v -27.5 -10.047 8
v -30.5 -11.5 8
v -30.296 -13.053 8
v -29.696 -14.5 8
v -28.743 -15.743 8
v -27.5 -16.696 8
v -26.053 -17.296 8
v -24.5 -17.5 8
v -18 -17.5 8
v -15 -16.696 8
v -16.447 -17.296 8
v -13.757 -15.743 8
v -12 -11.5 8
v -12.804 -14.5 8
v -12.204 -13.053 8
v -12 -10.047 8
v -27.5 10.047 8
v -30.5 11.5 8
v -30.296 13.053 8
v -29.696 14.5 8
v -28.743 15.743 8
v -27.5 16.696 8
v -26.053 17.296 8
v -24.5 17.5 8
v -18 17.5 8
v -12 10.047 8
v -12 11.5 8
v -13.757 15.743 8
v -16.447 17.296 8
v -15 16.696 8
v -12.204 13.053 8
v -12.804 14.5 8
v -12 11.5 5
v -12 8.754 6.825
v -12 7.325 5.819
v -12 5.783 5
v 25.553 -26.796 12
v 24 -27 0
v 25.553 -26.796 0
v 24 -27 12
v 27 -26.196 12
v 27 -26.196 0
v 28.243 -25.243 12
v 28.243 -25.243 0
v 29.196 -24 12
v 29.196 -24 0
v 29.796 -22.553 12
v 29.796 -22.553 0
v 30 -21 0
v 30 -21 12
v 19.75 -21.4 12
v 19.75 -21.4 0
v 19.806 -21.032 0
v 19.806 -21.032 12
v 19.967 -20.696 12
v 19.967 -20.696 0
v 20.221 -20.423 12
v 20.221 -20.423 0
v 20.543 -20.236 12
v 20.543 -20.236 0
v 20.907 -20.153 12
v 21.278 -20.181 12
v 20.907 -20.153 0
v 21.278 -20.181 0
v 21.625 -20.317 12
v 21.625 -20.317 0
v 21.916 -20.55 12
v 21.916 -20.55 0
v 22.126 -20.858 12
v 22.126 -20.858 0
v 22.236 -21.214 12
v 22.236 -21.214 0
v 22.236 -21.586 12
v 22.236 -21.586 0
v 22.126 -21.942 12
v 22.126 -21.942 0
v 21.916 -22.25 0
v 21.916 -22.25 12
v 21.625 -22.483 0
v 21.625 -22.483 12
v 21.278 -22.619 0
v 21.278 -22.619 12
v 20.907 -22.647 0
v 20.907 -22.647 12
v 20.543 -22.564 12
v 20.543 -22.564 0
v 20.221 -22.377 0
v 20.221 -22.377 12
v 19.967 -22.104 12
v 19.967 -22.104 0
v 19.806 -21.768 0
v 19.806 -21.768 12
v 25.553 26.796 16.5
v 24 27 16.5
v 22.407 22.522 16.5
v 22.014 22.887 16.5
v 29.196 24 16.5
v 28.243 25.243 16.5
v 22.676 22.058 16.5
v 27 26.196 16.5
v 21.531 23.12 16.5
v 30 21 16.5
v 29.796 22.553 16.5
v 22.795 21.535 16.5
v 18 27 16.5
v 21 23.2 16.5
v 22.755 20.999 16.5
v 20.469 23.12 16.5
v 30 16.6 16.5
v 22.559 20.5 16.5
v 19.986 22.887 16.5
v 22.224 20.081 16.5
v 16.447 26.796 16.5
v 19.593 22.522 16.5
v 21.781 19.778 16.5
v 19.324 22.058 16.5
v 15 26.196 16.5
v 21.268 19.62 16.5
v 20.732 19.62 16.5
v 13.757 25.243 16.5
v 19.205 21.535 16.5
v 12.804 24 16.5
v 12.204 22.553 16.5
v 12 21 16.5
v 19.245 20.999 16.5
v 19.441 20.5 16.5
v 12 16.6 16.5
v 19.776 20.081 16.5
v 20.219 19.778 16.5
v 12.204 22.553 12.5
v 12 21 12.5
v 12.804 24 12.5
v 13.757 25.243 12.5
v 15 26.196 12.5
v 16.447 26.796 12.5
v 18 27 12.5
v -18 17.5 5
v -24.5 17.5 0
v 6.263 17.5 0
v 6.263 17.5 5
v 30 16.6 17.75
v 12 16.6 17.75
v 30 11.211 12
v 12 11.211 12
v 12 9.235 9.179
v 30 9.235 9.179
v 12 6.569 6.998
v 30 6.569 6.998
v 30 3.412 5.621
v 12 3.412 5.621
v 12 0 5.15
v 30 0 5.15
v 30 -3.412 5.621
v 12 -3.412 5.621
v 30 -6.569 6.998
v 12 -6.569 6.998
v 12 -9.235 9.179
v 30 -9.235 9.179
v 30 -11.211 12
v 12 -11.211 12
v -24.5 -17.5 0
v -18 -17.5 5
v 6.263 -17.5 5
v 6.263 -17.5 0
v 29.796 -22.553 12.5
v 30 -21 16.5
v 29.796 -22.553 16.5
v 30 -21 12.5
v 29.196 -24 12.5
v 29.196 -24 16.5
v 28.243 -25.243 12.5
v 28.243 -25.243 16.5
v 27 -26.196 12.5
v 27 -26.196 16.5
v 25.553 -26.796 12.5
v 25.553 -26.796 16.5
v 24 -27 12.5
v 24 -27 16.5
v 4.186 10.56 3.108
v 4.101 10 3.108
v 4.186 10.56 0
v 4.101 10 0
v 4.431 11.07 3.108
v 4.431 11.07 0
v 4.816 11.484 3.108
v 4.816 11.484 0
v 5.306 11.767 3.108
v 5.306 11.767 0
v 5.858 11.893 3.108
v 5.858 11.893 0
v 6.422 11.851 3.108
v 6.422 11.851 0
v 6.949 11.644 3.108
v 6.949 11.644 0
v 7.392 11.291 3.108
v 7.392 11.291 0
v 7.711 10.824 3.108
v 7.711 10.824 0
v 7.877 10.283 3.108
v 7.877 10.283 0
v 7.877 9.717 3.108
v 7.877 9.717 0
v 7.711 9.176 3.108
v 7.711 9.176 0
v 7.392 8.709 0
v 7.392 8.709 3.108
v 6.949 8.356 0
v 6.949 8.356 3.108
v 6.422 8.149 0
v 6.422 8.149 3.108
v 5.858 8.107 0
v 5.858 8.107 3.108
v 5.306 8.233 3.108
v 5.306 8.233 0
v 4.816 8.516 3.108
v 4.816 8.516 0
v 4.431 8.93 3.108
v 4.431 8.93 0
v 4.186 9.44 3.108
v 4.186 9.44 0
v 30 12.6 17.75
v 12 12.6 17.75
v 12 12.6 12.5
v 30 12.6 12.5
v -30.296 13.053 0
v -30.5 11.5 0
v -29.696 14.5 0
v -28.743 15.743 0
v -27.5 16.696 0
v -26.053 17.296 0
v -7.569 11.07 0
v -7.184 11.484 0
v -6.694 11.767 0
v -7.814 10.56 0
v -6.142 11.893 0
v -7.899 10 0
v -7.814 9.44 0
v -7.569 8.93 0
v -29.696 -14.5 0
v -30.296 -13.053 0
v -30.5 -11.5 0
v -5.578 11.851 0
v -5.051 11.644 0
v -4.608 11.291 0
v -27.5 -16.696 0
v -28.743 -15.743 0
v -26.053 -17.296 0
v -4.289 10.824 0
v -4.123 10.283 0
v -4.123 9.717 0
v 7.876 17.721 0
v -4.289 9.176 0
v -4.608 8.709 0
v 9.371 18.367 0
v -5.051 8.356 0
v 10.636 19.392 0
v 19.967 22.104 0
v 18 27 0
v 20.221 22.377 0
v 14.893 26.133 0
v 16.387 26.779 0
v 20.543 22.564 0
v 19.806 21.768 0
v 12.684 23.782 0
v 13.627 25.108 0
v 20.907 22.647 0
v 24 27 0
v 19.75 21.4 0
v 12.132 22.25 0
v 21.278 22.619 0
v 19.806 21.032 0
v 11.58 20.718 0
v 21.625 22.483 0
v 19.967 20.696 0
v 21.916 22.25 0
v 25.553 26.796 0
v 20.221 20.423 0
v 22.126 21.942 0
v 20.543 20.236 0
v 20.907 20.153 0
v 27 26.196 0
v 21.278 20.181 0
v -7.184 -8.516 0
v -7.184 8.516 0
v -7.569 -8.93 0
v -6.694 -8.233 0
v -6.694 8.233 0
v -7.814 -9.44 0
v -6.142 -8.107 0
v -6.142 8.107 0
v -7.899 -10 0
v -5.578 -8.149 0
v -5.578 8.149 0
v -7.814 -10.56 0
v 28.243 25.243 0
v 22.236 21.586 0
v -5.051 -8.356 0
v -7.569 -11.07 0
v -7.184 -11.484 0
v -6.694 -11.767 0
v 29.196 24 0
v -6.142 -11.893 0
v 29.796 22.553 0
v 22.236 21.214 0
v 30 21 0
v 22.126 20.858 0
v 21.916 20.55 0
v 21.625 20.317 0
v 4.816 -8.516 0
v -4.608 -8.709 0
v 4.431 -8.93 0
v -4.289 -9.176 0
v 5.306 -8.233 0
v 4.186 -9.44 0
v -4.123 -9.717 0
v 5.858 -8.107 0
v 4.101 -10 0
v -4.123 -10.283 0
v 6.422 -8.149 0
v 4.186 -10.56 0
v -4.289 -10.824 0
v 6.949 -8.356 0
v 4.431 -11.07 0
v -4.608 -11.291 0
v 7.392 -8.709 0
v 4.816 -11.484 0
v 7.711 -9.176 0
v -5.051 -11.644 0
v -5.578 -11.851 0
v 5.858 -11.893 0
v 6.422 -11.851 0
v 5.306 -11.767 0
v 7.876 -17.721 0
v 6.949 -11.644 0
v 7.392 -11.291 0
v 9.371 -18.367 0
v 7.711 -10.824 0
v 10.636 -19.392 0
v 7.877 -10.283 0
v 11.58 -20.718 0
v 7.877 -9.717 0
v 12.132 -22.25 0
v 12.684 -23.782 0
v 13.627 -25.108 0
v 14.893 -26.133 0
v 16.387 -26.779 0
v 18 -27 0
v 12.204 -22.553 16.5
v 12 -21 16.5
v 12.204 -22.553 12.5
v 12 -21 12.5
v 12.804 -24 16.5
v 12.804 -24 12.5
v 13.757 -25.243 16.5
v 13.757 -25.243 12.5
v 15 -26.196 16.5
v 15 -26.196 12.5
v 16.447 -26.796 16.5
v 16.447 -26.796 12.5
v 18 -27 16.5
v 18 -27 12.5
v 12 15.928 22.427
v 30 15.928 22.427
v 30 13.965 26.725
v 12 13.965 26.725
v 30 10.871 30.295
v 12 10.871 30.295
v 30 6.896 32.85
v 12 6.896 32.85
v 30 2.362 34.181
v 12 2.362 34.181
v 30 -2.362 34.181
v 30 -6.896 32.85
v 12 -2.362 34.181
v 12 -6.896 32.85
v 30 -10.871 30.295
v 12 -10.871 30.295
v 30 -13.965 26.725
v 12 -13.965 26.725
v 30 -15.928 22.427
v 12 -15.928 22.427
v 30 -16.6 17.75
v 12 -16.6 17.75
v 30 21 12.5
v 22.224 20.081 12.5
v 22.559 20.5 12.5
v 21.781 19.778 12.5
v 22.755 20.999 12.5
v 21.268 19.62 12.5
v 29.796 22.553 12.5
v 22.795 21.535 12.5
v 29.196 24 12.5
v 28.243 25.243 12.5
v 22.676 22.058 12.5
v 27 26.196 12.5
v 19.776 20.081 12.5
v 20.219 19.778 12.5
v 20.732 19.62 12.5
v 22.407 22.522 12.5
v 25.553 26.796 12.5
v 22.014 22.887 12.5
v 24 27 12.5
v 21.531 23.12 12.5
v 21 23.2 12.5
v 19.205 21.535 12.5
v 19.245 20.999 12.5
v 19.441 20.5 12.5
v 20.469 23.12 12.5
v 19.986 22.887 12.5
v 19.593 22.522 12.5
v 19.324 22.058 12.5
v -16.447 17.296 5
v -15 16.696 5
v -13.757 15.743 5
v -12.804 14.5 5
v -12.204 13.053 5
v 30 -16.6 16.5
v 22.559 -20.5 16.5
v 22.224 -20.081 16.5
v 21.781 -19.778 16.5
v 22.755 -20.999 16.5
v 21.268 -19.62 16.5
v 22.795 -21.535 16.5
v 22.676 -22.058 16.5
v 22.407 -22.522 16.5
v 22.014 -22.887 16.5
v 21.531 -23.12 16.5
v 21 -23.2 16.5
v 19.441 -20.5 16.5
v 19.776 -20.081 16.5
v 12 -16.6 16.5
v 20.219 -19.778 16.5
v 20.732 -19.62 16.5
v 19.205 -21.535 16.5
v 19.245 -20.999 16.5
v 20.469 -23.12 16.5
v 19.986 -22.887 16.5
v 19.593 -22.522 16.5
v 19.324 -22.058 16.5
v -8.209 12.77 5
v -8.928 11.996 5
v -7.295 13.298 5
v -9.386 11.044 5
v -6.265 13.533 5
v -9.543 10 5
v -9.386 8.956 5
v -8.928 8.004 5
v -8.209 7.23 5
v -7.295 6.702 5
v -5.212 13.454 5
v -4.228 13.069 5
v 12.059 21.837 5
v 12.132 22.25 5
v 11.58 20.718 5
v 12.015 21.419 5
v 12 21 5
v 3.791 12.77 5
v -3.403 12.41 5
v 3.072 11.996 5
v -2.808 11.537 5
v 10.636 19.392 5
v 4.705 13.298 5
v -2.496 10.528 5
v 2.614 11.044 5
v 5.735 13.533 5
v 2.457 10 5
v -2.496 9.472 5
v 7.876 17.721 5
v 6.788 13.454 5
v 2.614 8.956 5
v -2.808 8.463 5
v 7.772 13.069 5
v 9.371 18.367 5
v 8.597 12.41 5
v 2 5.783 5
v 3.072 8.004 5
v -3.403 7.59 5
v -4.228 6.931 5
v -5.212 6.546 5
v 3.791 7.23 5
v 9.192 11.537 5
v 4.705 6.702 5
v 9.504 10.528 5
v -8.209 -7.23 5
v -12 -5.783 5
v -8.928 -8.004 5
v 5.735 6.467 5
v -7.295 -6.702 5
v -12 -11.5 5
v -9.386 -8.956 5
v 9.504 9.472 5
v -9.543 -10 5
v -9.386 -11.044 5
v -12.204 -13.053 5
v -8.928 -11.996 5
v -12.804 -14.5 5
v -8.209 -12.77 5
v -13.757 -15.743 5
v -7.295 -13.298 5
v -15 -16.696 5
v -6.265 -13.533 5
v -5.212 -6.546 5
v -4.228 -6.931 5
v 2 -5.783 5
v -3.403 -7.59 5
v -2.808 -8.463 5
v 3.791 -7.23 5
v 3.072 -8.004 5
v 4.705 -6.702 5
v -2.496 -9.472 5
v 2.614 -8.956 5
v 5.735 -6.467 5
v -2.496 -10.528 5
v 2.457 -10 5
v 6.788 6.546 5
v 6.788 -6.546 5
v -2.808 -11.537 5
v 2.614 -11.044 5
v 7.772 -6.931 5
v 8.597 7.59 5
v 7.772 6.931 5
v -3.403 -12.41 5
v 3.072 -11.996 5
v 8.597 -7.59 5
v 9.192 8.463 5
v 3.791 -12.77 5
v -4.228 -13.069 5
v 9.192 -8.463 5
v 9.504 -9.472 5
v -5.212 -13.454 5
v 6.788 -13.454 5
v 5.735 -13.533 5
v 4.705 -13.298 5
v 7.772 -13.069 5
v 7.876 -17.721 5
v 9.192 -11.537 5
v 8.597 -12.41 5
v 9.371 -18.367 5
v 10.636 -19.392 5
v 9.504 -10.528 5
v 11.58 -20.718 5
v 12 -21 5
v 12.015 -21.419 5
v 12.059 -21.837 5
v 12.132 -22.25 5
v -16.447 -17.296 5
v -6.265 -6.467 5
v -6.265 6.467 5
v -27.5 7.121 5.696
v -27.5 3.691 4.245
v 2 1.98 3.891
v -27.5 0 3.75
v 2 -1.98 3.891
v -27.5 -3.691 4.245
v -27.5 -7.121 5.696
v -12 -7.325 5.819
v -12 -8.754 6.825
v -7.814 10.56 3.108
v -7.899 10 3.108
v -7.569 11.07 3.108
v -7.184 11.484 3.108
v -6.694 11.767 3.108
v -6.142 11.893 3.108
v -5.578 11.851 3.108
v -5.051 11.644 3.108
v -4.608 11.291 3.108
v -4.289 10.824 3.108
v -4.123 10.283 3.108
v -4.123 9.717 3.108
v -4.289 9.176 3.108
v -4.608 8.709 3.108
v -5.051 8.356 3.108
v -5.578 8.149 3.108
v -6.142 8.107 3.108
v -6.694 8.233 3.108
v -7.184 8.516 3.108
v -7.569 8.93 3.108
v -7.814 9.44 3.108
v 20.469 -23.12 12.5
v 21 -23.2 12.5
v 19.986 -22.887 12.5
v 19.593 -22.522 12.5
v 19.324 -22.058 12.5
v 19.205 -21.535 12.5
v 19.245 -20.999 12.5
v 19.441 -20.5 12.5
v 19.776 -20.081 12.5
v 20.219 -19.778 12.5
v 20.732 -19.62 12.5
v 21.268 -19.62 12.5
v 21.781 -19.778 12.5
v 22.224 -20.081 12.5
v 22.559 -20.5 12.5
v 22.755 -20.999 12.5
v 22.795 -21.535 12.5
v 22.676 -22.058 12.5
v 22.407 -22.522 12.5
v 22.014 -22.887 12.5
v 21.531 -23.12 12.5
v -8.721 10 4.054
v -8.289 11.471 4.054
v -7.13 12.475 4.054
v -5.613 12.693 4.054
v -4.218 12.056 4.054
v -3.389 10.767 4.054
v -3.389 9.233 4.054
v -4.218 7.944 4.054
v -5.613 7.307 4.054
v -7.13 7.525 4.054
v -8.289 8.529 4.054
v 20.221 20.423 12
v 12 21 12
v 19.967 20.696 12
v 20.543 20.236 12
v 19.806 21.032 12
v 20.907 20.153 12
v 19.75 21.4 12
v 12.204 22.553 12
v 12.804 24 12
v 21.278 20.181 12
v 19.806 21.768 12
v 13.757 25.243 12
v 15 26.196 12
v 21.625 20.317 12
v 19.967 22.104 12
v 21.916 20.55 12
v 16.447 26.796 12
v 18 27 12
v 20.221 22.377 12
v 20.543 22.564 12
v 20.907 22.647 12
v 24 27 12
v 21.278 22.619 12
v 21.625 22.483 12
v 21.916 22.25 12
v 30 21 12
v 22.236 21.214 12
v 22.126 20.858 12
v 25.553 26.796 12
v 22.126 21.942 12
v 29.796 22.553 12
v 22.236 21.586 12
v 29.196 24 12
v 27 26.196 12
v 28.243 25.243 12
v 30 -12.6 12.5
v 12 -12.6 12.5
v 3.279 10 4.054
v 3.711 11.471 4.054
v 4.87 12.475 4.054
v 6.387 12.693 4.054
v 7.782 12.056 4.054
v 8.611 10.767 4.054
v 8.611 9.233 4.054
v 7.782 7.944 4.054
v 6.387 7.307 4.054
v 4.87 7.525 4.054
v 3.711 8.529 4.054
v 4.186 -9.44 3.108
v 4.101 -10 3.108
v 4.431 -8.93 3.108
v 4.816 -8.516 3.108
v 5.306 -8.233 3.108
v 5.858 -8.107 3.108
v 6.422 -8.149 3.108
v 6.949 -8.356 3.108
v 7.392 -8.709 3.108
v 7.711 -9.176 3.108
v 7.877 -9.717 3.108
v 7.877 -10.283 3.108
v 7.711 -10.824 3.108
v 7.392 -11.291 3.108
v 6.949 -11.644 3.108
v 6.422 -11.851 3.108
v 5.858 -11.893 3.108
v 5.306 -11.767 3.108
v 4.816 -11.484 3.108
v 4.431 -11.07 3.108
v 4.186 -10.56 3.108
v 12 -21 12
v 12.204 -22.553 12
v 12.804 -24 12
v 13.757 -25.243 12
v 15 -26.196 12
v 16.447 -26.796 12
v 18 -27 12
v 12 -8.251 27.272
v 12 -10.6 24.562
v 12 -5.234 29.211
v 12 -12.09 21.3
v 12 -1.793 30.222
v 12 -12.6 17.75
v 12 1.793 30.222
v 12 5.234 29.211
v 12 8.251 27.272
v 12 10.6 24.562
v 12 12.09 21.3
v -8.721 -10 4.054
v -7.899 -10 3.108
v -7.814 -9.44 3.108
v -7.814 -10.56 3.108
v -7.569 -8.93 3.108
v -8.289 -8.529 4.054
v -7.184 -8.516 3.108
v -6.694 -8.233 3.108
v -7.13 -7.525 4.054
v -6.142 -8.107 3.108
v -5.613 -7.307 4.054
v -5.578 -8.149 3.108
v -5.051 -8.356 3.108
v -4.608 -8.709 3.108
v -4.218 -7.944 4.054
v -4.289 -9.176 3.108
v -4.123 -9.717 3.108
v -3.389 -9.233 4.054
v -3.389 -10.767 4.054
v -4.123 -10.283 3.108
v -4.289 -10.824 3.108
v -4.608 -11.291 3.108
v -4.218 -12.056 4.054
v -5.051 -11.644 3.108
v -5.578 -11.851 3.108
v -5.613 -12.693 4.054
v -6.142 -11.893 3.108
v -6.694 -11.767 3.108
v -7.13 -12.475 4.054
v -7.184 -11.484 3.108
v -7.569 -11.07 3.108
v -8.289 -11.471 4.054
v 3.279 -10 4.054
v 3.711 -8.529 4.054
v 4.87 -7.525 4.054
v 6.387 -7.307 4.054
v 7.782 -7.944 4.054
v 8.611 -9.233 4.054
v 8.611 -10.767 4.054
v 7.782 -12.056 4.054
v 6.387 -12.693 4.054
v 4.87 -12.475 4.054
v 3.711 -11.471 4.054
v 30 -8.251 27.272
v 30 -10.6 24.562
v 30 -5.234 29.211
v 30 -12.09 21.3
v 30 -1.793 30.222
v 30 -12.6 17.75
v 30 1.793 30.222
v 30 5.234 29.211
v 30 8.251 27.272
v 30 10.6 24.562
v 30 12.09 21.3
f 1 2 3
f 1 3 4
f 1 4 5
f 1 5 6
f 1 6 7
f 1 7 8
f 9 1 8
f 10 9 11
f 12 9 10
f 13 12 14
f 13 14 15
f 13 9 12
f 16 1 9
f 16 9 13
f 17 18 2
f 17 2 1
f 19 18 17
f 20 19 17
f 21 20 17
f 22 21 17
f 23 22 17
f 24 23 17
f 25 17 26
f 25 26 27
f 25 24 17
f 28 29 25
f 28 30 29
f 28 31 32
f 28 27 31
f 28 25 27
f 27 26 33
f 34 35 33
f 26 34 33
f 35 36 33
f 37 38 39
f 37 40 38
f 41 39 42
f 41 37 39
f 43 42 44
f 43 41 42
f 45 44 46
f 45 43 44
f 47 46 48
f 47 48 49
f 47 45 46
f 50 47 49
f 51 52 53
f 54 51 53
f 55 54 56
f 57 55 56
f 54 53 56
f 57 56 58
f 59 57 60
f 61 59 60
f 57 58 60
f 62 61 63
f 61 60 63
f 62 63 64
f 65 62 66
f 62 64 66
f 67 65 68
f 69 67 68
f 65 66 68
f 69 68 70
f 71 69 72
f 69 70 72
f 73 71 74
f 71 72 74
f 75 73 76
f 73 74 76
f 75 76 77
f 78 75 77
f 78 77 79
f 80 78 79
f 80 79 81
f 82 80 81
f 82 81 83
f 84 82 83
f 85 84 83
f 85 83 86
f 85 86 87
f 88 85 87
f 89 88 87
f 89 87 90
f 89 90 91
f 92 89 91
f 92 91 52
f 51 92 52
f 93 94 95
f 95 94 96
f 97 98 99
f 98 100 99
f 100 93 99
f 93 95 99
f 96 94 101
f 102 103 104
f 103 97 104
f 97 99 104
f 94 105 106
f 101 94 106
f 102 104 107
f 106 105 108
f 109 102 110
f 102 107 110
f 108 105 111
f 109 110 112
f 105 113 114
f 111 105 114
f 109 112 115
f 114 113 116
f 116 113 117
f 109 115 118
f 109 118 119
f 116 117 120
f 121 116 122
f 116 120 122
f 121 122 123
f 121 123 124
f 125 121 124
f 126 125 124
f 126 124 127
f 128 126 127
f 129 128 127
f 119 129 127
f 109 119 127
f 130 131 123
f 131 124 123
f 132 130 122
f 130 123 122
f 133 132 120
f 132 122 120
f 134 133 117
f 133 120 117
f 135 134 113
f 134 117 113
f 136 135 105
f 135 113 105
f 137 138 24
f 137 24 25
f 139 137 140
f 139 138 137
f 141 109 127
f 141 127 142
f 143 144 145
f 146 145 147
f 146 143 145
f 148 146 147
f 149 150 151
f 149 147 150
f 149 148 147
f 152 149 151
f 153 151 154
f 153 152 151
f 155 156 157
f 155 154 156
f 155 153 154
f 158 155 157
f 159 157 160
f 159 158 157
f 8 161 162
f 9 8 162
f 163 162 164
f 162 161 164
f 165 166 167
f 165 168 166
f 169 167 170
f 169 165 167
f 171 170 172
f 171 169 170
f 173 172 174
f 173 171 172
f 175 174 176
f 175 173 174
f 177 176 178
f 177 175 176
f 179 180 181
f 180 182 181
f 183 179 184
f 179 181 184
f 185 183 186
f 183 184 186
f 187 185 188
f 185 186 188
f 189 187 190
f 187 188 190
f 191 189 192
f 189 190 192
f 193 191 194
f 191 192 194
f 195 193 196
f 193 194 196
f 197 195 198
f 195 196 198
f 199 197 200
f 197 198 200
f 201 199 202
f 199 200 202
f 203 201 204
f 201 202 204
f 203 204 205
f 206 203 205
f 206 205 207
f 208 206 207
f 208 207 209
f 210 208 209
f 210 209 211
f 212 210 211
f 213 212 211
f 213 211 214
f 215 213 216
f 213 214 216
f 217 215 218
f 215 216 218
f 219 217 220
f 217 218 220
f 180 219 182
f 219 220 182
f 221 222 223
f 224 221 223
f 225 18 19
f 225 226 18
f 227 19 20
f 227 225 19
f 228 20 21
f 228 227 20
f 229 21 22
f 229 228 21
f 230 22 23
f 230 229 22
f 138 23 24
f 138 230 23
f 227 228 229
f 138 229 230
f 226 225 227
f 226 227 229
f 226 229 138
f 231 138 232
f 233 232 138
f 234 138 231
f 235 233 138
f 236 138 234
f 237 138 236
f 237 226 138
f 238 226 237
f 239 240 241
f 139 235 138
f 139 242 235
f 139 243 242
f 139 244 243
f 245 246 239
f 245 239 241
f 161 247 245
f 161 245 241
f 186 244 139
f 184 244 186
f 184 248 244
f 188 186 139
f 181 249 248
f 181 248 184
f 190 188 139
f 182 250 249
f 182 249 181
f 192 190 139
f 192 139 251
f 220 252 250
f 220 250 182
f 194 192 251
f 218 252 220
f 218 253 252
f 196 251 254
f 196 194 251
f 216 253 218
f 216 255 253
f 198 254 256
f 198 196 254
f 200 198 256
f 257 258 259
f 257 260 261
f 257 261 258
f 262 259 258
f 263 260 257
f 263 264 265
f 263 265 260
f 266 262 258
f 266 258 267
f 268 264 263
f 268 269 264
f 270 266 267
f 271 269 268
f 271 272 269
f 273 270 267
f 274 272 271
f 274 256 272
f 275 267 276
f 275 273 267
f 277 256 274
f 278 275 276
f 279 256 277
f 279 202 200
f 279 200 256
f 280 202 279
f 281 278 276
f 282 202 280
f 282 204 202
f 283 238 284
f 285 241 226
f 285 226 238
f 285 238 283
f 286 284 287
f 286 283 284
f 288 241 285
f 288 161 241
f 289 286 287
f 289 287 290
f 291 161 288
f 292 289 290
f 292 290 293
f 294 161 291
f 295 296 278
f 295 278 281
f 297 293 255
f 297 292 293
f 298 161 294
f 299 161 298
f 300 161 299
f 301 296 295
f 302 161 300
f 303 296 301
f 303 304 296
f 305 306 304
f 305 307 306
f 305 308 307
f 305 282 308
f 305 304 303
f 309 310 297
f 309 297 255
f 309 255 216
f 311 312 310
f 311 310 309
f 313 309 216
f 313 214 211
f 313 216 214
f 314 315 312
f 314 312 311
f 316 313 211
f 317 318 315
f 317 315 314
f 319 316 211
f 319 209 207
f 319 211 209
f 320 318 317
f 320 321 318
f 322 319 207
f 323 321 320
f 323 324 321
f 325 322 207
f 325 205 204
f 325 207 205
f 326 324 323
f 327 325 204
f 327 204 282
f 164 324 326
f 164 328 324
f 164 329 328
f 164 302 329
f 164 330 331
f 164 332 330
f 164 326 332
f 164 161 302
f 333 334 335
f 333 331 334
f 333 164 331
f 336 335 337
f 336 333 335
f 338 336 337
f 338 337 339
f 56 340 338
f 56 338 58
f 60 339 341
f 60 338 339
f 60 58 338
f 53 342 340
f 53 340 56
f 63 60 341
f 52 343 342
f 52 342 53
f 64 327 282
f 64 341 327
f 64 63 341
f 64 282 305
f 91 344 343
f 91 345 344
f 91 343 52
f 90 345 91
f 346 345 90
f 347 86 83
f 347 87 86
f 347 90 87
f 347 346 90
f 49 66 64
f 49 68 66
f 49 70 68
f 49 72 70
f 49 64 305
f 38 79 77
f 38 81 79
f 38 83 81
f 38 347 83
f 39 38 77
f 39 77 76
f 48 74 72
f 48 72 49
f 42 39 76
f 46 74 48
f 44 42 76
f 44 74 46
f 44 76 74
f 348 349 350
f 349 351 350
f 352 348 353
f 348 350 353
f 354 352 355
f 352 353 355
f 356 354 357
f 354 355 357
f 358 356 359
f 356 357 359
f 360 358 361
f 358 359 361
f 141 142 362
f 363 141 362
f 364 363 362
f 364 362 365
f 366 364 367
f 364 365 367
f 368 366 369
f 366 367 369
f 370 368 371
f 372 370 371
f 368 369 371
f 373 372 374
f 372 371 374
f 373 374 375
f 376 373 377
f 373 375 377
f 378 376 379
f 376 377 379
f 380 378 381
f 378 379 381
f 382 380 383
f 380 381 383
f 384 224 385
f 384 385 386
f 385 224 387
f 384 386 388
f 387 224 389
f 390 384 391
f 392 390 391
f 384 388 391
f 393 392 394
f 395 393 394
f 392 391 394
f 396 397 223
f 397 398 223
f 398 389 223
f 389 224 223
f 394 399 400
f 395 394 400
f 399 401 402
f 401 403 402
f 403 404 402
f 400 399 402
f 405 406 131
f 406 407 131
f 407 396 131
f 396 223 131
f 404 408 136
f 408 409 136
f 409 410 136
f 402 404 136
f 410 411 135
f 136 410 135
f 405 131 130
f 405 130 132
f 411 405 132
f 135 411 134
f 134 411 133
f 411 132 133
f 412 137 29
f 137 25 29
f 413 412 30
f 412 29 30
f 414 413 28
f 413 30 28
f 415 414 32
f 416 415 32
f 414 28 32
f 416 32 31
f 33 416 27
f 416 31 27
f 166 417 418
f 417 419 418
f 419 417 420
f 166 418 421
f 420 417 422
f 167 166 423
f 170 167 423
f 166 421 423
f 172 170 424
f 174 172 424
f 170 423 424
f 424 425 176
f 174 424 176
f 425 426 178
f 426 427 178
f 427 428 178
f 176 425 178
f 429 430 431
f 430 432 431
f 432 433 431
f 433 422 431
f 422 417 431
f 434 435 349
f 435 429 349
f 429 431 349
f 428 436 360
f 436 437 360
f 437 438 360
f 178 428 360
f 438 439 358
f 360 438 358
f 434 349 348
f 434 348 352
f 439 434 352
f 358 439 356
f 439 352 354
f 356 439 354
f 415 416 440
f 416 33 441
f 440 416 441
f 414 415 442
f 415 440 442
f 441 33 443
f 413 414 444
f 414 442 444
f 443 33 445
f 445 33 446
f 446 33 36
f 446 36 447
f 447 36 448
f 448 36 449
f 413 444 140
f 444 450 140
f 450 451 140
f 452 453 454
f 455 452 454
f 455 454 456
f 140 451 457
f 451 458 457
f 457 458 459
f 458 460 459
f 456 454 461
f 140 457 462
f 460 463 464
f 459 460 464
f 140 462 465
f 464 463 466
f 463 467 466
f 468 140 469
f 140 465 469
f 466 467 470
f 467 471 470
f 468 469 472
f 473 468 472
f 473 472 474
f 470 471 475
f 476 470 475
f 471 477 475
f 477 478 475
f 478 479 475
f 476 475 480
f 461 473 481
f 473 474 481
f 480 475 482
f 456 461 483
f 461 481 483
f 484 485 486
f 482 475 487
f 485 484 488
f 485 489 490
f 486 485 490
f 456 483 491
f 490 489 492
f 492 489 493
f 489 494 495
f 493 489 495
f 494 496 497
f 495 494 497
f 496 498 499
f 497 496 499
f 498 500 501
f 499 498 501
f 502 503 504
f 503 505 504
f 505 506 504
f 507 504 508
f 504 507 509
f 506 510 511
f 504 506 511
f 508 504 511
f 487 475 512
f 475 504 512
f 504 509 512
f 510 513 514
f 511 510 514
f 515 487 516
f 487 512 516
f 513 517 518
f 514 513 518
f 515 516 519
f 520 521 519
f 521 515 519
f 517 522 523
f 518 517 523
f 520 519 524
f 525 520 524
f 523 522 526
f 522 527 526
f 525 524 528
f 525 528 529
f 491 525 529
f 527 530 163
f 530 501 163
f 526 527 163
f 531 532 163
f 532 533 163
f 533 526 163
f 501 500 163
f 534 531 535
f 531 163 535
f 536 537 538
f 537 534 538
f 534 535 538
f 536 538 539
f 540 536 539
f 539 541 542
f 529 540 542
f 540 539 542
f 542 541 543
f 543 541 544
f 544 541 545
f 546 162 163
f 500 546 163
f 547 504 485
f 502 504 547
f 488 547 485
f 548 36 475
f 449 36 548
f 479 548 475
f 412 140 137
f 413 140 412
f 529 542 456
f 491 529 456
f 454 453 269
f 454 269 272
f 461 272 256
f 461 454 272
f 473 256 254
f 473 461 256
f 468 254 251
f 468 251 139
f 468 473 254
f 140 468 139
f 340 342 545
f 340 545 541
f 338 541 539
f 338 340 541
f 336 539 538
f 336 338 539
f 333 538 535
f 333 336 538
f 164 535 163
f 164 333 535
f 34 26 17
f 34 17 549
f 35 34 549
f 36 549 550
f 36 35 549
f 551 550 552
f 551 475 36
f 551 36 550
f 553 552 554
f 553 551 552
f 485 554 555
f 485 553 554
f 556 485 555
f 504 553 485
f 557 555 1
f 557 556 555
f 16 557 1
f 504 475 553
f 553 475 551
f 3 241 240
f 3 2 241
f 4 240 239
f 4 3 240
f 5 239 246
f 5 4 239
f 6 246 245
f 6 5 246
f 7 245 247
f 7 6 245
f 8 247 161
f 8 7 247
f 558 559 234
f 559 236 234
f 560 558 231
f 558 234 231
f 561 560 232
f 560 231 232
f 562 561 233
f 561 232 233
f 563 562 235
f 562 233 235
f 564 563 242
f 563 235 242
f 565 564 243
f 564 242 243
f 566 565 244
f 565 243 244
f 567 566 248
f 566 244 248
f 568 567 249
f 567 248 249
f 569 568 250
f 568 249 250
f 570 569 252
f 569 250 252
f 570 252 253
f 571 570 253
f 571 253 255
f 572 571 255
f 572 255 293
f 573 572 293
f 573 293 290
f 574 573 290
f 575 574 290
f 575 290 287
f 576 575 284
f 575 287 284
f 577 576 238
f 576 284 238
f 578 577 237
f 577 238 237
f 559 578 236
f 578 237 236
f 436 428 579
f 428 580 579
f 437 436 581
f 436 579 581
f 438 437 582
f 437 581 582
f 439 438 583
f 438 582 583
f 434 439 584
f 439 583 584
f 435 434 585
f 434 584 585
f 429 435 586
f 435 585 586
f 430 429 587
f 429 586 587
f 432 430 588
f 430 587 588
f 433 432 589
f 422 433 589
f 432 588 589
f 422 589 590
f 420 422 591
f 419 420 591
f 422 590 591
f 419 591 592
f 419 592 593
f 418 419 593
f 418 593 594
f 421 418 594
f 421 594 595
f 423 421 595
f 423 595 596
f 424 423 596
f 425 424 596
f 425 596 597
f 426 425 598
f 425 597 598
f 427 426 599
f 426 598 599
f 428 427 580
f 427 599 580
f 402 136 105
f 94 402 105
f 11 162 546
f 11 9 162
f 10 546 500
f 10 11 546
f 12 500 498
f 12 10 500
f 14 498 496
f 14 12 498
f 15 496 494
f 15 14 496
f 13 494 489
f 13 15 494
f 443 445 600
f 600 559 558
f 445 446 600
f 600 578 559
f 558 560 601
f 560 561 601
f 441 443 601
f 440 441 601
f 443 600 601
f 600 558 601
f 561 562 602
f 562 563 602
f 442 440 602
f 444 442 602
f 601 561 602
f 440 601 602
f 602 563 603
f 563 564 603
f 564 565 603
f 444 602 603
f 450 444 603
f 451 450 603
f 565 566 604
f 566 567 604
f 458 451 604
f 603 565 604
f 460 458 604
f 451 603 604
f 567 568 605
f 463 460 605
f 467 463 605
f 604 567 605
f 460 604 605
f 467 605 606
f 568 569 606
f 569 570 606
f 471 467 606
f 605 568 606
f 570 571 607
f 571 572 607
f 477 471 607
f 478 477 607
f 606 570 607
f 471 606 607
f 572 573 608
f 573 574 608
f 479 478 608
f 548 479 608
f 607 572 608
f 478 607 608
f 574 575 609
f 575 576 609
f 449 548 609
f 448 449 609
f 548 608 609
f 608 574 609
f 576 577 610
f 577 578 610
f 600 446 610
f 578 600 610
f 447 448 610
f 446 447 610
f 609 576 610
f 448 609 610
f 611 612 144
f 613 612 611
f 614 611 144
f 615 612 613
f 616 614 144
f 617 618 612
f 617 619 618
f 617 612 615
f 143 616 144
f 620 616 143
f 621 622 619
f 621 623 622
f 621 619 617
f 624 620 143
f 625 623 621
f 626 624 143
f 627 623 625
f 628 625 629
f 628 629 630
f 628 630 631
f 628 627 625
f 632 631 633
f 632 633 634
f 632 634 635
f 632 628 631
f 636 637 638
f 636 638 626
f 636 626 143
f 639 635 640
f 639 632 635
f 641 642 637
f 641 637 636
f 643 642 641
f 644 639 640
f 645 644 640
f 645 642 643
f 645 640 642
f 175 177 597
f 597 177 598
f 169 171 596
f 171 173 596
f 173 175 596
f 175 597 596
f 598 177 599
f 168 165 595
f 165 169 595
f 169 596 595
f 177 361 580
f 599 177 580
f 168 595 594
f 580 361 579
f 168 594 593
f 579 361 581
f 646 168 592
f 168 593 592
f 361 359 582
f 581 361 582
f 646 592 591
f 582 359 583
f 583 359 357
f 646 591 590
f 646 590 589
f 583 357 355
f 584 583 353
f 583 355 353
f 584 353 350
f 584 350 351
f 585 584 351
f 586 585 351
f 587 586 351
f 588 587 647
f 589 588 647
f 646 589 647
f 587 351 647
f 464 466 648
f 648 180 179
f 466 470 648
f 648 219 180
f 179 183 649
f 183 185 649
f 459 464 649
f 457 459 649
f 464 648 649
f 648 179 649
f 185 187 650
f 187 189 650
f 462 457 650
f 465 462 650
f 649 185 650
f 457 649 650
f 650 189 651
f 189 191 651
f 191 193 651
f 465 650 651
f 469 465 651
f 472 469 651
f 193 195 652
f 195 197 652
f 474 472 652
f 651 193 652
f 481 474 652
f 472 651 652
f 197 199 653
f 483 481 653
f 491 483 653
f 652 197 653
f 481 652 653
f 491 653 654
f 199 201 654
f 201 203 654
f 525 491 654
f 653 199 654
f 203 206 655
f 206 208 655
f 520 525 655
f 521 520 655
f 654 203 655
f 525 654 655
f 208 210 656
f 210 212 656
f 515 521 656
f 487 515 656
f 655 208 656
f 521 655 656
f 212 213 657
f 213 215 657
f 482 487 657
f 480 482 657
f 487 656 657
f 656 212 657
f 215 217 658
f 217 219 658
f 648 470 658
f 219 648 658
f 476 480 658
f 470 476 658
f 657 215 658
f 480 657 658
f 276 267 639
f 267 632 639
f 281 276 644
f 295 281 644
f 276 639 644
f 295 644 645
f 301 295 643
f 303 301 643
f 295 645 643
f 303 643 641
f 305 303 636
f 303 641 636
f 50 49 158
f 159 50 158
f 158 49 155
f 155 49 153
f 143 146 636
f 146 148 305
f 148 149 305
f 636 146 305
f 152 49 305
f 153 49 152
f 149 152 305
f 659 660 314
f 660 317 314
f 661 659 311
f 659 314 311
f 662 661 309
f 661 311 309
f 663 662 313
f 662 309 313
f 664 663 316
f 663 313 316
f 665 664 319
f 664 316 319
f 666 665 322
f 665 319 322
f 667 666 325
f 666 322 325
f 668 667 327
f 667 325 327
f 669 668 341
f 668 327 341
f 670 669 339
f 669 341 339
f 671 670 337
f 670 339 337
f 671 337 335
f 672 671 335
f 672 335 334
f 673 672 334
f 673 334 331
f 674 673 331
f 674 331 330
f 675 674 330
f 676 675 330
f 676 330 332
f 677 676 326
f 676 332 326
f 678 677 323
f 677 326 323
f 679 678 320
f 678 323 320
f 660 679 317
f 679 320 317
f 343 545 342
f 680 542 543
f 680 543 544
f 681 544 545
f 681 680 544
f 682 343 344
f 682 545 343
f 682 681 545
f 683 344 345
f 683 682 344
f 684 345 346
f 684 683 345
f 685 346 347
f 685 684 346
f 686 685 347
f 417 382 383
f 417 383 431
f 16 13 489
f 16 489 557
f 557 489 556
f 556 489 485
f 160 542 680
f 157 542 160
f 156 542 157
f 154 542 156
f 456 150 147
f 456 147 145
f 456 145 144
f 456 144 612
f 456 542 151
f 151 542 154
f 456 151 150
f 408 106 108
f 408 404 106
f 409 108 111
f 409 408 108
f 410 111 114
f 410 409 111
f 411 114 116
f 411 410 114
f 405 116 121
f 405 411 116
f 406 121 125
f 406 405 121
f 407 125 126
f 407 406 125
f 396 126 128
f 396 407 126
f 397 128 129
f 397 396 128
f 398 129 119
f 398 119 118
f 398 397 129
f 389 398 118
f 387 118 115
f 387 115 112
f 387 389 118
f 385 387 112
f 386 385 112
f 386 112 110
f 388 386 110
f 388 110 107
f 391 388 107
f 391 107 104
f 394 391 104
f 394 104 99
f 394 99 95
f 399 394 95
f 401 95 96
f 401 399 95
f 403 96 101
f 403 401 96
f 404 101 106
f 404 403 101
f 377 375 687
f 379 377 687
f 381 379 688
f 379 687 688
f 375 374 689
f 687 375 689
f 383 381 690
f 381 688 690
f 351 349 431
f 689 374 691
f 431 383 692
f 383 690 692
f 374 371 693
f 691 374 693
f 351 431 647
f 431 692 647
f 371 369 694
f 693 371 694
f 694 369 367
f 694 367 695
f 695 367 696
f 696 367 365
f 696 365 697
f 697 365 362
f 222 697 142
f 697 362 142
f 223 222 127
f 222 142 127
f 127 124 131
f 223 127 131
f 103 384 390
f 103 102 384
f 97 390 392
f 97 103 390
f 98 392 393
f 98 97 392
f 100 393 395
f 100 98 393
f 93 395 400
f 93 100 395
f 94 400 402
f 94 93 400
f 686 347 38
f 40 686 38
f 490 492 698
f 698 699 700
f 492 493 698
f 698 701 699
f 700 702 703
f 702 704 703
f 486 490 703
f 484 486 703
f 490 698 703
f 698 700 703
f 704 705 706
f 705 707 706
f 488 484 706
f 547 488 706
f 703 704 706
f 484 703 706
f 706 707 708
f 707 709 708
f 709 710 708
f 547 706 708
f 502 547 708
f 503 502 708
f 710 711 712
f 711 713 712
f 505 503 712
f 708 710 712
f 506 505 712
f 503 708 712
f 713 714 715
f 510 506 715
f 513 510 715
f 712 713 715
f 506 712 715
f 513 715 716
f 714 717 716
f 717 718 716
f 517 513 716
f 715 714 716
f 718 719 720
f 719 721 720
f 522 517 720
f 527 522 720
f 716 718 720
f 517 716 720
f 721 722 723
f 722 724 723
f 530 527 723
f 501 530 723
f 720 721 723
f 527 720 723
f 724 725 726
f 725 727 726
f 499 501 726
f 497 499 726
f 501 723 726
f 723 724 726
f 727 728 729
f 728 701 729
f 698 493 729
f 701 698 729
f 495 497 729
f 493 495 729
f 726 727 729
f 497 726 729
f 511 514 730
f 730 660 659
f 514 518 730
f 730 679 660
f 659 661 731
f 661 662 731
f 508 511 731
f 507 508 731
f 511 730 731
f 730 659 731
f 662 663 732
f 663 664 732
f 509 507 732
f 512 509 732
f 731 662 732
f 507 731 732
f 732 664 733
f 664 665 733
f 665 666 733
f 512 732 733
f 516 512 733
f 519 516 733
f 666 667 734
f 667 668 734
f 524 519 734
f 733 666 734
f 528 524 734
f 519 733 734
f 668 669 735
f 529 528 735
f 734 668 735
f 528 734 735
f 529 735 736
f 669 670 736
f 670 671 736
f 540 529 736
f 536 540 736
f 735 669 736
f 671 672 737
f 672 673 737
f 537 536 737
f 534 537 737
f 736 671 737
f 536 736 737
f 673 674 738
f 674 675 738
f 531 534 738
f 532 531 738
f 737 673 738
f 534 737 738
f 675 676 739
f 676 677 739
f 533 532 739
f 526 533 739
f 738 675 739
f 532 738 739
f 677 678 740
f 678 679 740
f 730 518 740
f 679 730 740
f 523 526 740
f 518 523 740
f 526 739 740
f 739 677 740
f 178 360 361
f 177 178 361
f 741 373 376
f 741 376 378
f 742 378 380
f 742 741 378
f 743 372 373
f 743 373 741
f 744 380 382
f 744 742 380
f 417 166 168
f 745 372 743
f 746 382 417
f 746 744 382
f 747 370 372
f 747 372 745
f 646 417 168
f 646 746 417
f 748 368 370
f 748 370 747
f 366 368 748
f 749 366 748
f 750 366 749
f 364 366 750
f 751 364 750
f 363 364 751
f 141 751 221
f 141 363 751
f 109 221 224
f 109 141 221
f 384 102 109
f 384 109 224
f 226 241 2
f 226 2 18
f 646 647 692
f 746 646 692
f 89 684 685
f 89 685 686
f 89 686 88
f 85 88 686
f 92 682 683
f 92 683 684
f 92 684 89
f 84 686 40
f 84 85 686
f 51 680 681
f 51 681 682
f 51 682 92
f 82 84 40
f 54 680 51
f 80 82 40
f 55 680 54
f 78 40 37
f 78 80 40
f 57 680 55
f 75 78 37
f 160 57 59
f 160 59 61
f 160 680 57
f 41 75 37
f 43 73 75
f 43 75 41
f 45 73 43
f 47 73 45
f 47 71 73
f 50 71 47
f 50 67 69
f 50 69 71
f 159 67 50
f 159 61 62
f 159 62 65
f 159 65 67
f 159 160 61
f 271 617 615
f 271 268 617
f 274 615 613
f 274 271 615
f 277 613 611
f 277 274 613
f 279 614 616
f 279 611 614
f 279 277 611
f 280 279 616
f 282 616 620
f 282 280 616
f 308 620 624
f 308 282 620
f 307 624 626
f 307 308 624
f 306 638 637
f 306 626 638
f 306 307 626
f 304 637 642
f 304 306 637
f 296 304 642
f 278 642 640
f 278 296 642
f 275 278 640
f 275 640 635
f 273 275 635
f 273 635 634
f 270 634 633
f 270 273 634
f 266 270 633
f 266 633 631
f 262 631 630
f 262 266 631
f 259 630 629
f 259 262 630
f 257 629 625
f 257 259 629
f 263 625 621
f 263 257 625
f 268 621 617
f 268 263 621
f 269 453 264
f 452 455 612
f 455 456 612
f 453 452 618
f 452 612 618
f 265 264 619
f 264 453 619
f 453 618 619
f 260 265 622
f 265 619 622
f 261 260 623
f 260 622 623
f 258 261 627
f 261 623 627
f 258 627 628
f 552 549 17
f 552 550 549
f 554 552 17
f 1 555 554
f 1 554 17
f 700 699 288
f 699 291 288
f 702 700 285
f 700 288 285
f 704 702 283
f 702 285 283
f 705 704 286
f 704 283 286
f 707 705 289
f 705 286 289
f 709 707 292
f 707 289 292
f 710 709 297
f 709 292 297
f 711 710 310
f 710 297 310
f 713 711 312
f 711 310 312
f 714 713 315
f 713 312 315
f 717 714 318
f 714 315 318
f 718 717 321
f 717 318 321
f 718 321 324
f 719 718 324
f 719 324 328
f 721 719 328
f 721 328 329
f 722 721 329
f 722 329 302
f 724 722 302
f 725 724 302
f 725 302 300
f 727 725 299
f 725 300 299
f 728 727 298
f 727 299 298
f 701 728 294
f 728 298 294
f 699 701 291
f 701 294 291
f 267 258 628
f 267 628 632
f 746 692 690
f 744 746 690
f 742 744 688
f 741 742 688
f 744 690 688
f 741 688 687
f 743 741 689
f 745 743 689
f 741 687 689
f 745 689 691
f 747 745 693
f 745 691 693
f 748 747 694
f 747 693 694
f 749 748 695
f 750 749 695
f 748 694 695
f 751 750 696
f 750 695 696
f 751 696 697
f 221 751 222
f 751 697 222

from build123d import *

# Parameters (mm, degrees)
BASE_SKETCH_W                        = 60.5
BASE_SKETCH_H                        = 35
BASE_EXTRUDE_DEPTH                   = 5
CRADLE_SKETCH_W                      = 18.5
CRADLE_SKETCH_H                      = 35
CRADLE_SKETCH_W_2                    = 18
CRADLE_SKETCH_H_2                    = 54
CRADLE_EXTRUDE_DEPTH                 = 12
NO_6_MOUNTING_HOLES_D                = 3.7973
NO_6_MOUNTING_HOLES_CSINK_D          = 7.0866
NO_6_MOUNTING_HOLES_CSINK_ANGLE      = 82
MOVE_START                           = 8
MOVE_FACE_OUTLINE_W                  = 18.5
MOVE_FACE_OUTLINE_H                  = 35
MOVE_FACE_DEPTH                      = 4
CLAMP_THREADED_HOLE_IN_BASE_D        = 2.5
CRADLE_FILLETS_R                     = 6
BASE_FILLETS_R                       = 6
MOTOR_START                          = 12
MOTOR_CLAMP_EXTRUDE_DEPTH            = 18
CLAMP_MOUNTING_HOLE_PROFILE_SKETCH_W = 1.8
CLAMP_MOUNTING_HOLE_PROFILE_SKETCH_H = 4
CLAMP_CORNER_FILLETS_R               = 6


# Read off the part's stored shape, not the designer's step: Move Face
with BuildPart() as part:
    # Base Sketch → Base Extrude (new body)
    with BuildSketch(Plane.XY):
        with Locations((-0.25, 0)):
            Rectangle(BASE_SKETCH_W, BASE_SKETCH_H)
    extrude(amount=BASE_EXTRUDE_DEPTH)

    # Cradle Sketch → Cradle Extrude (add)
    with BuildSketch(Plane.XY):
        with Locations((-21.25, 0)):
            Rectangle(CRADLE_SKETCH_W, CRADLE_SKETCH_H)
        with Locations((21, 0)):
            Rectangle(CRADLE_SKETCH_W_2, CRADLE_SKETCH_H_2)
    extrude(amount=CRADLE_EXTRUDE_DEPTH)

    # No. 6 Mounting Holes (through all)
    with Locations(Plane.XY.offset(5)):
        with Locations((-6, 10), (6, 10), (-6, -10), (6, -10)):
            CounterSinkHole(NO_6_MOUNTING_HOLES_D / 2, NO_6_MOUNTING_HOLES_CSINK_D / 2, counter_sink_angle=NO_6_MOUNTING_HOLES_CSINK_ANGLE)

    # Pump and Motor Revolve Cut Sketch → Pump and Motor Revolve Cut (revolve, cut)
    with BuildSketch(Plane(origin=(0, 0, 0), x_dir=(1, 0, 0), z_dir=(0, 1, 0))):
        Polygon((-27.5, -17.75), (-27.5, -3.75), (2, -3.75), (2, -5.15), (44.5, -5.15), (44.5, -17.75), align=None)
    revolve(axis=Axis((44.5, 0, 17.75), (-1, 0, 0)), mode=Mode.SUBTRACT)

    # Move Face outline → Move Face (cut)
    with BuildSketch(Plane.XY.offset(MOVE_START)):
        with Locations((-21.25, 0)):
            Rectangle(MOVE_FACE_OUTLINE_W, MOVE_FACE_OUTLINE_H)
    extrude(amount=MOVE_FACE_DEPTH, mode=Mode.SUBTRACT)

    # Clamp Threaded Hole in Base (through all)
    with Locations(Plane.XY.offset(12)):
        with Locations((21, -21.4)):
            clamp_threaded_hole_in_base = Hole(CLAMP_THREADED_HOLE_IN_BASE_D / 2)

    # Cradle Fillets
    cradle_fillets_edges = [part.edges().sort_by_distance(p)[0] for p in [
        (-12, -17.5, 6.5),
        (-12, 17.5, 6.5),
        (12, 27, 6),
        (30, -27, 6),
        (12, -27, 6),
        (30, 27, 6),
        (-30.5, -17.5, 4),
        (-30.5, 17.5, 4),
    ]]
    fillet(cradle_fillets_edges, radius=CRADLE_FILLETS_R)

    # Base Fillets
    # the kernel refuses this fillet: 6 mm, written as the material it adds along each edge
    with BuildSketch(Plane(origin=(12, 17.5, 5), x_dir=(0.027705718818601687, 0.9996161228915551, 0), z_dir=(0, 0, -1))) as base_fillets_piece_1:
        with BuildLine():
            CenterArc((5.83875749, -5.900726721), BASE_FILLETS_R, 100.437075268, 77.975300819)
            Line((-0.158939247, -5.734492409), (-0.758708921, -5.717868977))
            Line((-0.758708921, -5.717868977), (-0.599769674, 0.016623431))
            Line((-0.599769674, 0.016623431), (0.016623431, 0.599769674))
            ThreePointArc((0.016623431, 0.599769674), (3.515279861, 0.502799658), (4.643130779, 0.590072672))
            Line((4.643130779, 0.590072672), (4.751824117, 0))
        make_face()
    extrude(amount=5)
    with BuildSketch(Plane(origin=(12, -17.5, 0), x_dir=(-1, 0, 0), z_dir=(0, 0, 1))) as base_fillets_piece_2:
        with BuildLine():
            CenterArc((5.736694594, 6), BASE_FILLETS_R, 192.024699181, 77.975300819)
            Line((-0.131652703, 4.75), (-0.718487433, 4.625))
            ThreePointArc((-0.718487433, 4.625), (-0.6, 3.5), (-0.6, 0))
            Line((-0.6, 0), (0, -0.6))
            Line((0, -0.6), (5.736694594, -0.6))
            Line((5.736694594, -0.6), (5.736694594, 0))
        make_face()
    extrude(amount=5)


with BuildPart() as body_2:
    # Motor Clamp Sketch → Motor Clamp Extrude (new body)
    with BuildSketch(Plane(origin=(0, 0, 0), x_dir=(0, 0, -1), z_dir=(1, 0, 0)).offset(MOTOR_START)):
        with BuildLine():
            Line((-17.75, -16.6), (-16.5, -16.6))
            Line((-16.5, -16.6), (-16.5, -27))
            Line((-16.5, -27), (-12.5, -27))
            Line((-12.5, -27), (-12.5, -12.6))
            Line((-12.5, -12.6), (-17.75, -12.6))
            ThreePointArc((-17.75, -12.6), (-30.35, 0), (-17.75, 12.6))
            Line((-17.75, 12.6), (-12.5, 12.6))
            Line((-12.5, 12.6), (-12.5, 27))
            Line((-12.5, 27), (-16.5, 27))
            Line((-16.5, 27), (-16.5, 16.6))
            Line((-16.5, 16.6), (-17.75, 16.6))
            ThreePointArc((-17.75, 16.6), (-34.35, 0), (-17.75, -16.6))
        make_face()
    extrude(amount=MOTOR_CLAMP_EXTRUDE_DEPTH)

    # Clamp Mounting Hole Profile Sketch → Clamp Mounting Hole (revolve, cut)
    with BuildSketch(Plane(origin=(21, -21.4, 16.5), x_dir=(0, -1, 0), z_dir=(1, 0, 0))):
        with Locations((0.9, 2)):
            Rectangle(CLAMP_MOUNTING_HOLE_PROFILE_SKETCH_W, CLAMP_MOUNTING_HOLE_PROFILE_SKETCH_H)
    clamp_mounting_hole = revolve(axis=Axis((21, -21.4, 22.85), (0, 0, -1)), mode=Mode.SUBTRACT)


with BuildPart() as motor_clamp_screw_holes_mirror_tool:
    # Motor Clamp Screw Holes Mirror: Clamp Threaded Hole in Base, Clamp Mounting Hole across plane
    add(clamp_threaded_hole_in_base.mirror(Plane.ZX))
    add(clamp_mounting_hole.mirror(Plane.ZX))


with BuildPart() as part_1:
    add(part.part)

    # Motor Clamp Screw Holes Mirror: cut by motor_clamp_screw_holes_mirror_tool
    add(motor_clamp_screw_holes_mirror_tool.part, mode=Mode.SUBTRACT)


with BuildPart() as body_2_1:
    add(body_2.part)

    # Motor Clamp Screw Holes Mirror: cut by motor_clamp_screw_holes_mirror_tool
    add(motor_clamp_screw_holes_mirror_tool.part, mode=Mode.SUBTRACT)

    # Clamp Corner Fillets
    clamp_corner_fillets_edges = [body_2_1.edges().sort_by_distance(p)[0] for p in [
        (12, -27, 14.5),
        (12, 27, 14.5),
        (30, 27, 14.5),
        (30, -27, 14.5),
    ]]
    fillet(clamp_corner_fillets_edges, radius=CLAMP_CORNER_FILLETS_R)


solid = Compound([part_1.part, body_2_1.part])
